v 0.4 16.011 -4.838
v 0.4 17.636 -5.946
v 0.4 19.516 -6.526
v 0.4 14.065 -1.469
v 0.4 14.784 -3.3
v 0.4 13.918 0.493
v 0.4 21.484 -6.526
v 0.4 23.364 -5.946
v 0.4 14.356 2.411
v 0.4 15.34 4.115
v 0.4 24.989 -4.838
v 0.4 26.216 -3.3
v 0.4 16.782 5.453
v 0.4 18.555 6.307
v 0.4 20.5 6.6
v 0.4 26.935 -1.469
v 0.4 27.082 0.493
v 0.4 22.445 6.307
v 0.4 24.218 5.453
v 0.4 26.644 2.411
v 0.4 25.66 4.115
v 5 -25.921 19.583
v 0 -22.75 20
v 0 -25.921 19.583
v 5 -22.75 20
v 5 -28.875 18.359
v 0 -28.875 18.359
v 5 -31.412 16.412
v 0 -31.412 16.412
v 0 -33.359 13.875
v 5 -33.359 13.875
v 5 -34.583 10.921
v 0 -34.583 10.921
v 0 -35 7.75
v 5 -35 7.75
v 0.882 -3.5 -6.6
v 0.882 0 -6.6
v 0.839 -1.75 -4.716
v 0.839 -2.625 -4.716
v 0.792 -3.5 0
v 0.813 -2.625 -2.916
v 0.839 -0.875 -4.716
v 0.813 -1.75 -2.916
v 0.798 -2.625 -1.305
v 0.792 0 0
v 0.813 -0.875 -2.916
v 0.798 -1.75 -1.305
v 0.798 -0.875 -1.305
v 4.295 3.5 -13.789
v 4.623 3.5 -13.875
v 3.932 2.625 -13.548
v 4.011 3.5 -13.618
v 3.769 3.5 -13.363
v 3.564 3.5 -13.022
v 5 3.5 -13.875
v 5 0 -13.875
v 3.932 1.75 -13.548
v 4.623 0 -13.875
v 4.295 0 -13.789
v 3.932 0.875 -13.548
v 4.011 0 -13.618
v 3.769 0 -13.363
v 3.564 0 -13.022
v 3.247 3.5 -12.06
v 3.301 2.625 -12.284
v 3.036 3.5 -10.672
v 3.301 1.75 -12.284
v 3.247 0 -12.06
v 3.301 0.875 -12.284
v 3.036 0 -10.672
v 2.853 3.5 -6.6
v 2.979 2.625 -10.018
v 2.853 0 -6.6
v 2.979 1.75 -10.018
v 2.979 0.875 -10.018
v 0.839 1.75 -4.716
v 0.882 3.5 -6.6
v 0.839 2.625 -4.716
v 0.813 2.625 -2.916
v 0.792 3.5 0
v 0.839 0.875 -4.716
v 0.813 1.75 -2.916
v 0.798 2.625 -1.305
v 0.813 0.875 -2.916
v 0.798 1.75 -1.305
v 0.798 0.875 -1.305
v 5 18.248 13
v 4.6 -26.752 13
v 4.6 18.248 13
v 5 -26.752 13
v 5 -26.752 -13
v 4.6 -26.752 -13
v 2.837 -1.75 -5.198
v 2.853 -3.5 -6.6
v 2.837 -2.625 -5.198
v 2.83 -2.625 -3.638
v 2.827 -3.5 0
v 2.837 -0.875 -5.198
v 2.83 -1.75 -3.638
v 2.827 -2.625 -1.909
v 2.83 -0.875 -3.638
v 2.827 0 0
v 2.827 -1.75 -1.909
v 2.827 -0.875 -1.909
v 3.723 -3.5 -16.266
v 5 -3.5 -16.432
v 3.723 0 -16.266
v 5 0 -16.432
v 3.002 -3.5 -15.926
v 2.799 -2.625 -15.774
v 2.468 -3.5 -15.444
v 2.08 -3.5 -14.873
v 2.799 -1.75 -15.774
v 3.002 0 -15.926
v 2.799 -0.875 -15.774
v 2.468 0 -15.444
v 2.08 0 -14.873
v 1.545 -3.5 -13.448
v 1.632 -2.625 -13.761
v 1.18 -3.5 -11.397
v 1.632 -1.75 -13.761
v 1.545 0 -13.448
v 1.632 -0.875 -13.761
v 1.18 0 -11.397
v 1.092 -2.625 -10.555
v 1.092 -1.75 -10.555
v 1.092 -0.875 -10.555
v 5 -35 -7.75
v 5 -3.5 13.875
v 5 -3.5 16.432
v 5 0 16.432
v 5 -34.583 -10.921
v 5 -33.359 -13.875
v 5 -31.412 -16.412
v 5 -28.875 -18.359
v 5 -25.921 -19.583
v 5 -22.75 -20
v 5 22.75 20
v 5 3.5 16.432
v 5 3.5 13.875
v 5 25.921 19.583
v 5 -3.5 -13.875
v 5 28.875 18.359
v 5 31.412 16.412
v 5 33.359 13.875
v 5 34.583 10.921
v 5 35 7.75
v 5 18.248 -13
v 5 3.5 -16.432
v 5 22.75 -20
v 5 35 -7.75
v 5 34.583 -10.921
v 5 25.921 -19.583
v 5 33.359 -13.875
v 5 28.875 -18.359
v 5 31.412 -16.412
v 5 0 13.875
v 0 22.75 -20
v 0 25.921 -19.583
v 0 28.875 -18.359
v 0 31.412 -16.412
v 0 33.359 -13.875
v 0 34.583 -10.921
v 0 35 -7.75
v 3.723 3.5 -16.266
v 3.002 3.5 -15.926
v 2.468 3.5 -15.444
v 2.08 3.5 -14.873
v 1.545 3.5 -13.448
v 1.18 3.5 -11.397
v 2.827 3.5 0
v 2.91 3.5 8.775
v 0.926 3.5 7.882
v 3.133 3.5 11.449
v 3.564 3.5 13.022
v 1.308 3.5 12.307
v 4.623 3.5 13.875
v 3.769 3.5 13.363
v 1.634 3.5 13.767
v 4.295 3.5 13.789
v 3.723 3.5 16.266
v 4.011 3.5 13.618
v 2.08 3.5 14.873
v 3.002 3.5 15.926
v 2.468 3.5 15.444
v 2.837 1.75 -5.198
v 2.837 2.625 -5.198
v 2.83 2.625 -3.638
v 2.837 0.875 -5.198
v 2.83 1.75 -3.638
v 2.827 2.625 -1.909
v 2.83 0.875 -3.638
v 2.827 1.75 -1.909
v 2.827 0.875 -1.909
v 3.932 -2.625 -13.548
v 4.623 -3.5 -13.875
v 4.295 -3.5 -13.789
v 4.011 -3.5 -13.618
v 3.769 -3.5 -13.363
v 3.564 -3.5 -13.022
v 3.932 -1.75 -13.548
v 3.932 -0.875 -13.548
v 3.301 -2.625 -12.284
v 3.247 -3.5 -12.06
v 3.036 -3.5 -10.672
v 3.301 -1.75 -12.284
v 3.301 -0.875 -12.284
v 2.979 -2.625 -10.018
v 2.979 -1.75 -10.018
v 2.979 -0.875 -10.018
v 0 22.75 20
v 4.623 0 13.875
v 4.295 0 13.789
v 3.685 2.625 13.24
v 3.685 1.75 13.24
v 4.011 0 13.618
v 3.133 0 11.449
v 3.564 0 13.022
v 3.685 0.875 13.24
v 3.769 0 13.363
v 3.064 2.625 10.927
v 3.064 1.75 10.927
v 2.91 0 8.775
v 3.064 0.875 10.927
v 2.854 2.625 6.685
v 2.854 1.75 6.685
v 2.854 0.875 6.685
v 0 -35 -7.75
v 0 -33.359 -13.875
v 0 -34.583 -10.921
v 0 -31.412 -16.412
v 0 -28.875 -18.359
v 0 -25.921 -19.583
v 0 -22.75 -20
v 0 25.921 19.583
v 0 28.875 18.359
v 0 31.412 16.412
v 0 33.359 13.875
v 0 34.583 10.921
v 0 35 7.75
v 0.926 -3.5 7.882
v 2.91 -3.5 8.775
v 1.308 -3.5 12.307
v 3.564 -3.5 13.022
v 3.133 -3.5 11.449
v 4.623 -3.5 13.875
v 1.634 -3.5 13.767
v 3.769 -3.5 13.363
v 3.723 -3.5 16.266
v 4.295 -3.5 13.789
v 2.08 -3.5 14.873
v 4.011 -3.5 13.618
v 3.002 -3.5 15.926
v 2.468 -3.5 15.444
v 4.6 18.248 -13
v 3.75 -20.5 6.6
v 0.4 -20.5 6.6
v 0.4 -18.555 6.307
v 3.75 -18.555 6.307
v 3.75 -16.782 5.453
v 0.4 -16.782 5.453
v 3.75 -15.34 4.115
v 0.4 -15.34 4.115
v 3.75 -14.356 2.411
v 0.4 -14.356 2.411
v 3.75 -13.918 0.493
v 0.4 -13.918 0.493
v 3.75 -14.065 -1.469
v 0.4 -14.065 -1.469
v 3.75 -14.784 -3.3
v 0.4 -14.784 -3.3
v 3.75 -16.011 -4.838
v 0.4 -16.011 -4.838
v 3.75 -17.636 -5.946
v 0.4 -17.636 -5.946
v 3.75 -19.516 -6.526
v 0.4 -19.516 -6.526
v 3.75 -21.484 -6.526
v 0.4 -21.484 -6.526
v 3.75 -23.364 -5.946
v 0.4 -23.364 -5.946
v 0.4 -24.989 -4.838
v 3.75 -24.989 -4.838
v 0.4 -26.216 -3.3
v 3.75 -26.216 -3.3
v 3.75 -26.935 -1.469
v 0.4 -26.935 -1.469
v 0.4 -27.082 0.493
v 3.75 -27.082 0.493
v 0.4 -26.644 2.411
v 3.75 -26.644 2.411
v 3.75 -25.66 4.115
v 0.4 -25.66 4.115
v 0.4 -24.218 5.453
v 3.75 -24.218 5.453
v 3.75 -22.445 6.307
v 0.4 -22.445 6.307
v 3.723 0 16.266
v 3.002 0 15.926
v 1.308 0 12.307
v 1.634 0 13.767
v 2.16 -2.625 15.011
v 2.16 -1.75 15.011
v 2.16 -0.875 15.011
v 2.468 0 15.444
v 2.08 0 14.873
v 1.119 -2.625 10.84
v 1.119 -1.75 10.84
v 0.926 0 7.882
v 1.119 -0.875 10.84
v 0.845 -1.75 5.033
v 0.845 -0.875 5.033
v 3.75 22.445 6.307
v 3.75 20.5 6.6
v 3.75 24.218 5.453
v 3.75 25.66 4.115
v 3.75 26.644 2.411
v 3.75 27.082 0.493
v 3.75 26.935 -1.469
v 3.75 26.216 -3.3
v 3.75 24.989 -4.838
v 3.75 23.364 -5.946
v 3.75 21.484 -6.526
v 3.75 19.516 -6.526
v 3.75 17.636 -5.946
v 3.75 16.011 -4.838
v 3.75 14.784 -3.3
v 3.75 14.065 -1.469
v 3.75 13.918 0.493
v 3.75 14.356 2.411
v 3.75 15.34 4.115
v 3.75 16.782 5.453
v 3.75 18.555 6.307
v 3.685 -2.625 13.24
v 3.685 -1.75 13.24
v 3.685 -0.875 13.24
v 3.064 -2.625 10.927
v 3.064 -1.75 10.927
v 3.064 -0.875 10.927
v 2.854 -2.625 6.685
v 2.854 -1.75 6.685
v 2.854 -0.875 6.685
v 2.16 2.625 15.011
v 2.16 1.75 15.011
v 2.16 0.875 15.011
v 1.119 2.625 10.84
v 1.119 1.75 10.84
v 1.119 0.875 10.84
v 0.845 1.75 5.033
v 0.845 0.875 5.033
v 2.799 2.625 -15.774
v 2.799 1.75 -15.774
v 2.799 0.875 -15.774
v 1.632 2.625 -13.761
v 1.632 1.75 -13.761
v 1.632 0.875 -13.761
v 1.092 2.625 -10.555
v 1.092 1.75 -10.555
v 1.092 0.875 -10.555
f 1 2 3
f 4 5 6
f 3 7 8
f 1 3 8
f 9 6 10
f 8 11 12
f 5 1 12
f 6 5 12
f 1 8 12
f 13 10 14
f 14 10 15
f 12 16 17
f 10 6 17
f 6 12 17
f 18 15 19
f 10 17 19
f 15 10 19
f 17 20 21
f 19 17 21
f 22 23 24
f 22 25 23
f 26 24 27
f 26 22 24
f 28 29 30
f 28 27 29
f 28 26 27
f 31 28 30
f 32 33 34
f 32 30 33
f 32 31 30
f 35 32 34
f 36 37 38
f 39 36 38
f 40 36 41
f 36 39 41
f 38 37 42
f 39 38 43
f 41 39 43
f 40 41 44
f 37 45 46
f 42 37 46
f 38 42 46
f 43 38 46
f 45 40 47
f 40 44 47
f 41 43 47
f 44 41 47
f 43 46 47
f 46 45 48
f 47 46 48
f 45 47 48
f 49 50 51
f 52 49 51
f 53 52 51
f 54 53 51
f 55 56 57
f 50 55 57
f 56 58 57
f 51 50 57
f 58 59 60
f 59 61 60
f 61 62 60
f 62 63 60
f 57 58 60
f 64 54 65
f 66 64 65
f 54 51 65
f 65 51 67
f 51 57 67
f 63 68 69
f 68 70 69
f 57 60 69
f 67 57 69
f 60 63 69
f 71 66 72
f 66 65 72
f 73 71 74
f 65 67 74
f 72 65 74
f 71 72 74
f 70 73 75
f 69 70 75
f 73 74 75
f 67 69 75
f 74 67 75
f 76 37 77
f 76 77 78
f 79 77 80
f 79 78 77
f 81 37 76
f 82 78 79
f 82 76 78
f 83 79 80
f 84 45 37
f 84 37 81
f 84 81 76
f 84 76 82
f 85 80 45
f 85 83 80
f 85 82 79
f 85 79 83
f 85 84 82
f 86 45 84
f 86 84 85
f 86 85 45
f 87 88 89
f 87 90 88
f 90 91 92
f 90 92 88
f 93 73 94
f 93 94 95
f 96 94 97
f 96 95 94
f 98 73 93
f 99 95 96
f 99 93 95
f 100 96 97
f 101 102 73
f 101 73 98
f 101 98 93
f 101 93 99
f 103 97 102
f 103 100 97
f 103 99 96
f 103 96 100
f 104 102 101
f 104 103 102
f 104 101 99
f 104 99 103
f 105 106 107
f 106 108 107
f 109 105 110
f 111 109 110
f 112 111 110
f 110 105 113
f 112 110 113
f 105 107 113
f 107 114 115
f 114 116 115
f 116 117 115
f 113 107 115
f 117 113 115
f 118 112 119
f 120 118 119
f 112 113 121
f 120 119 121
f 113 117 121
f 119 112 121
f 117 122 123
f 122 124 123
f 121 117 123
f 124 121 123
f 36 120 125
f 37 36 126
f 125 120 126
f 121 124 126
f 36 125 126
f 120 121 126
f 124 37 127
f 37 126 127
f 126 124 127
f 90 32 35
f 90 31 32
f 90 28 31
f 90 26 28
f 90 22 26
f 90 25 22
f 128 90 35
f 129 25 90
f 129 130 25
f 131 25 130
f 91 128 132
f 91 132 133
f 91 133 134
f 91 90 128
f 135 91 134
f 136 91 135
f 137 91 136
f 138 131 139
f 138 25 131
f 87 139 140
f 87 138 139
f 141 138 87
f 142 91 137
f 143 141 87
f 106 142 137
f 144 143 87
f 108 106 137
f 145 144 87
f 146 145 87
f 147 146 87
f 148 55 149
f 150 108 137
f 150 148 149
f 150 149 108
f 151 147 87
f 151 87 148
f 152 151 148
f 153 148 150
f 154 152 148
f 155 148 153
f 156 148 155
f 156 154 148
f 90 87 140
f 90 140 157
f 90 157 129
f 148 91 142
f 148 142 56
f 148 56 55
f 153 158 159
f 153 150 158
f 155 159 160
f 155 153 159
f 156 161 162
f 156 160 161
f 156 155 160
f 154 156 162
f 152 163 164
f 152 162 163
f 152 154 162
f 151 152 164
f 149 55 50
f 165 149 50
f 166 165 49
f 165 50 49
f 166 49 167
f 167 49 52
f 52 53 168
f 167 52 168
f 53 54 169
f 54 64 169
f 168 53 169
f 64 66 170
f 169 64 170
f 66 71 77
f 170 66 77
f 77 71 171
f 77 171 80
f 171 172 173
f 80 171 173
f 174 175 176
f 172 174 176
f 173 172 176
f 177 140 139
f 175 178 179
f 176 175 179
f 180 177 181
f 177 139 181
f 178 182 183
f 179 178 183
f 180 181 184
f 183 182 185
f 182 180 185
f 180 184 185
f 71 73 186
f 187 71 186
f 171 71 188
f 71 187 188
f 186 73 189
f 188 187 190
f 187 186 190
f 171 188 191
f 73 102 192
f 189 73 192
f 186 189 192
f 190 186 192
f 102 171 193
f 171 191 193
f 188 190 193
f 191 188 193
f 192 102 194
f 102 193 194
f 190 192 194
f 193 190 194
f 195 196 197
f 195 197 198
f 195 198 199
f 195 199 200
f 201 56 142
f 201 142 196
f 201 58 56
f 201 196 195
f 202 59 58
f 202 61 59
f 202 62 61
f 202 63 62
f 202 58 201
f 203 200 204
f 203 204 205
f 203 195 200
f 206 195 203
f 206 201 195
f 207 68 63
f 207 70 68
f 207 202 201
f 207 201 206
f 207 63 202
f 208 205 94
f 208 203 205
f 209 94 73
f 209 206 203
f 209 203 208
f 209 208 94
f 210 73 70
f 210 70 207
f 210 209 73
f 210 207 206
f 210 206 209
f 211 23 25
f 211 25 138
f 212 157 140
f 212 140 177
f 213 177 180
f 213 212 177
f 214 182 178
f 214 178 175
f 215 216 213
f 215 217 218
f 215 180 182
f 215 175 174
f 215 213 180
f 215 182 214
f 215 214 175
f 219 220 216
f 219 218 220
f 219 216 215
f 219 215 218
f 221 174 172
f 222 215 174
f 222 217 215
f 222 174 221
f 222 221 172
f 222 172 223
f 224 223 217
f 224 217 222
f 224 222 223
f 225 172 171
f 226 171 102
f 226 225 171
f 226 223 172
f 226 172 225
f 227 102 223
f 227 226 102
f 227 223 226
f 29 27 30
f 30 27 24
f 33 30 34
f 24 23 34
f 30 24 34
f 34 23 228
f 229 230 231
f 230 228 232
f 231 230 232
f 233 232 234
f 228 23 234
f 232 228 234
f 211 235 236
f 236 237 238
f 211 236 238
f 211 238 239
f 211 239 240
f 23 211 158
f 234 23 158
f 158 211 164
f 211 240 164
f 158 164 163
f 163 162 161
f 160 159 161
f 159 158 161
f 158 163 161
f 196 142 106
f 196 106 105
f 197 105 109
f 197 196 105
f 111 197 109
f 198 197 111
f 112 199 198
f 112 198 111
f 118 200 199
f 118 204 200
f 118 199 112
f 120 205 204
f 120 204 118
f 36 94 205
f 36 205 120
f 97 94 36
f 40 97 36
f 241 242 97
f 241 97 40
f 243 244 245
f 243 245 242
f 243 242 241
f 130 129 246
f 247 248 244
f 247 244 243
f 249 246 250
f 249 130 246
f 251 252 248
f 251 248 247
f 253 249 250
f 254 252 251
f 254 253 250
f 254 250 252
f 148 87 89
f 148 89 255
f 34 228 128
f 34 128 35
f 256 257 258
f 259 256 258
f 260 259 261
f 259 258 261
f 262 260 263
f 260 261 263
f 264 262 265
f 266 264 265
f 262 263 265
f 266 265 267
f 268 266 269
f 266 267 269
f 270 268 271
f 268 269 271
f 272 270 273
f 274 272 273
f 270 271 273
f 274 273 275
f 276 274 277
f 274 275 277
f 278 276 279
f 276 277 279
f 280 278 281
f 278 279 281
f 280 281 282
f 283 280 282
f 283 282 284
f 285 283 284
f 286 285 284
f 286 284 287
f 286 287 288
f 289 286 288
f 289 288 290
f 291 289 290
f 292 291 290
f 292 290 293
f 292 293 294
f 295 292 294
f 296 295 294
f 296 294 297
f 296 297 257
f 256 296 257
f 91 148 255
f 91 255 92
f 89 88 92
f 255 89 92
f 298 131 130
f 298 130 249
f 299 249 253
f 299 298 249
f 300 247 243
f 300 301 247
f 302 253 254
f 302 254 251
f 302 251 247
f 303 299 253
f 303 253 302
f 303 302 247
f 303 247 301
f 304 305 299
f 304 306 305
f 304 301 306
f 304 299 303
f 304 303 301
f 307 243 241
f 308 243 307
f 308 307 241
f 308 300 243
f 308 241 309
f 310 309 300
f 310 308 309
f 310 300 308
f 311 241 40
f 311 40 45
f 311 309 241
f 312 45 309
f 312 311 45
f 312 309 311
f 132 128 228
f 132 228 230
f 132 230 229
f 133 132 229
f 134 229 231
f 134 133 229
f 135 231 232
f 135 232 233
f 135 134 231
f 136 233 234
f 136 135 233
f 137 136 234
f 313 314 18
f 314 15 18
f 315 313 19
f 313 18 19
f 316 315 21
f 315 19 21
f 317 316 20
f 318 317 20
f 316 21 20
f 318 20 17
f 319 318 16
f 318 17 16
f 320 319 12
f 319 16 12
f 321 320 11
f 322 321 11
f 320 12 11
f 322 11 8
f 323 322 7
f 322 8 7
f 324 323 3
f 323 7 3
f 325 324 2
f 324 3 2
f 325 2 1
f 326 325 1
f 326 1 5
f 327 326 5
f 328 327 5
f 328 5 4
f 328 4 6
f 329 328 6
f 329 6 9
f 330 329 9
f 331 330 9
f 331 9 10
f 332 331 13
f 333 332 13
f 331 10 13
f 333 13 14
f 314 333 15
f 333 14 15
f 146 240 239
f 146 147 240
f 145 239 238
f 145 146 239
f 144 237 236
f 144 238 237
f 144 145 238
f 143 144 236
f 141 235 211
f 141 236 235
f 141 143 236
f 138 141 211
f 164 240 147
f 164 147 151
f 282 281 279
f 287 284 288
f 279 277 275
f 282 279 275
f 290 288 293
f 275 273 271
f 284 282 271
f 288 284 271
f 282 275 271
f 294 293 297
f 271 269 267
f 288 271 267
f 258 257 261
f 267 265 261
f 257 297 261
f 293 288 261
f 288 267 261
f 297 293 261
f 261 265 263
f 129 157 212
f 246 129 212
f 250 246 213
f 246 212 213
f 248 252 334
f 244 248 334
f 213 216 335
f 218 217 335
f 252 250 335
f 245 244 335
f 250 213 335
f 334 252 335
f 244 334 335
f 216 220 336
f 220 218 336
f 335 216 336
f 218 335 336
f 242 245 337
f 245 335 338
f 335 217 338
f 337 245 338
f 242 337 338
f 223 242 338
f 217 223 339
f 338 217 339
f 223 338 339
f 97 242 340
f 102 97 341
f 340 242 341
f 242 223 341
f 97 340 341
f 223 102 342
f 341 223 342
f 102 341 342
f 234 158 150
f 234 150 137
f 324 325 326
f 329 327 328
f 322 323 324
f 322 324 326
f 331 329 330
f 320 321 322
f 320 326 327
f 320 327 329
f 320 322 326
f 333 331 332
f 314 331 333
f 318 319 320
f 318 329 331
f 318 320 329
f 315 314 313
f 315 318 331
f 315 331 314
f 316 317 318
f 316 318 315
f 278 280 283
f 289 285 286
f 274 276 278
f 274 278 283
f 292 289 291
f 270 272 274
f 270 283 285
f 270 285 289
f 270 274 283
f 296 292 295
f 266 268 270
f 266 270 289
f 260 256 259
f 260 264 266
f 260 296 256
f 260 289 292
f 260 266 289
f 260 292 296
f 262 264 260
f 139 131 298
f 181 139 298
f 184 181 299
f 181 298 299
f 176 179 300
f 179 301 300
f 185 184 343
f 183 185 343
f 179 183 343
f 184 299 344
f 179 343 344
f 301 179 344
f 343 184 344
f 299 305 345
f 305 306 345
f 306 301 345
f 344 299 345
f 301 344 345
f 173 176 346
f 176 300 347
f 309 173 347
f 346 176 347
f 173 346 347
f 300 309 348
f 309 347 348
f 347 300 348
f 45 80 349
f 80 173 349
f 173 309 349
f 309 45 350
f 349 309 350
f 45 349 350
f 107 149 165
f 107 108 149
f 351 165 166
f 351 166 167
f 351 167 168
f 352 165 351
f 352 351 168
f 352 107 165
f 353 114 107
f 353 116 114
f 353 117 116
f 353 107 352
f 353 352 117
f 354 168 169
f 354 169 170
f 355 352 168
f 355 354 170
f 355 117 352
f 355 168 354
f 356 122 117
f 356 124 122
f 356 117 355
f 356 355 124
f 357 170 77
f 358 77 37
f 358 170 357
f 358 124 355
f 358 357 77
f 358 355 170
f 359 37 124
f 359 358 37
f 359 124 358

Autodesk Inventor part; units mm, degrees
ref_plane "YZ Plane" through (0, 0, 0) normal (1, 0, 0) x (0, 1, 0)
ref_plane "XZ Plane" through (0, 0, 0) normal (0, 1, 0) x (-1, 0, 0)
ref_plane "XY Plane" through (0, 0, 0) normal (0, 0, 1) x (1, 0, 0)
ref_plane "Work Plane2" through (0, 0, 0) normal (1, 0, 0) x (0, 0, -1)
sketch "Sketch1" plane through (0, 0, 0) normal (1, 0, 0) x (0, 0, -1)
  line L0 (20, -35) -> (-20, -35)
  line L1 (-20, -35) -> (-20, 35)
  line L2 (-20, 35) -> (20, 35)
  line L3 (20, 35) -> (20, -35)
  line L4 (20, -35) -> (-20, 35) construction
  line L5 (-20, -35) -> (20, 35) construction
  point P0 (0, 0)
  dimension "d0" = 40
  dimension "d1" = 70
extrude "Extrusion1" add sketch "Sketch1" along normal blind 5
fillet "Fillet1" radius 12.25 4 edges at (2.5, -35, 20) (2.5, -35, -20) (2.5, 35, -20) (2.5, 35, 20)
sketch "Sketch2" plane through (0, 0, 0) normal (-1, 0, 0) x (0, 0, 1)
  circle A0 centre (0, -20.5) radius 6.6
  line L0 (30.2912, 0) -> (32.4021, 0)
  circle A1 centre (0, 20.5) radius 6.6
  point P0 (0, 0)
  dimension "d5" = 13.2
  dimension "d17" = 41
extrude "Extrusion2" cut sketch "Sketch2" against normal blind 3.75
sketch "Sketch3" plane through (0, 0, 0) normal (-1, 0, 0) x (0, 0, 1)
  circle A0 centre (0, 20.5) radius 6.6 projected
  circle A1 centre (0, -20.5) radius 6.6 projected
  point P0 (0, 0)
extrude "Extrusion3" add sketch "Sketch3" against normal blind 0.4
sketch "Sketch4" plane through (5, 0, 0) normal (1, 0, 0) x (0, 0, -1)
  line L0 (13, -26.7517) -> (-13, -26.7517)
  line L1 (-13, -26.7517) -> (-13, 18.2483)
  line L2 (-13, 18.2483) -> (13, 18.2483)
  line L3 (13, 18.2483) -> (13, -26.7517)
  line L4 (13, -26.7517) -> (-13, 18.2483) construction
  line L5 (-13, -26.7517) -> (13, 18.2483) construction
  point P0 (0, -4.2517)
  point P1 (0, 0)
  dimension "d10" = 26
  dimension "d11" = 45
  dimension "d12" = 0
extrude "Extrusion4" cut sketch "Sketch4" against normal blind 0.4
sketch "Sketch6" plane through (0, 0, 0) normal (0, 1, 0) x (-1, 0, 0)
  line L0 (5.3087, 0) -> (6.8591, 0)
  line L1 (-5, -20) -> (-5, -7.75) projected
  line L2 (-5, -13.875) -> (-3.2306, -14.0634) construction
  line L3 (-3.2306, -14.0634) -> (-2.8267, -12.0185) construction
  line L4 (-2.8267, -12.0185) -> (-2.8267, -8.1465) construction
  line L5 (-2.8267, -8.1465) -> (-2.8267, 0) construction
  spline S0 degree 4 poles (-5, -13.875) (-3.2306, -14.0634) (-2.8267, -12.0185) (-2.8267, -8.1465) (-2.8267, 0) knots 1 1 1 1 1 2 2 2 2 2
  line L6 (-5, -16.4324) -> (-0.7919, -16.4324) construction
  line L7 (-0.7919, -16.4324) -> (-0.9641, -12.8693) construction
  line L8 (-0.9641, -12.8693) -> (-0.7919, -3.5174) construction
  line L9 (-0.7919, -3.5174) -> (-0.7919, 0) construction
  line L10 (-0.4, -6.6) -> (-3.75, -6.6) projected
  spline S1 degree 4 poles (-5, -16.4324) (-0.7919, -16.4324) (-0.9641, -12.8693) (-0.7919, -3.5174) (-0.7919, 0) knots 1 1 1 1 1 2 2 2 2 2
  line L11 (-5, -16.4324) -> (-5, -13.875)
  line L12 (-2.8267, 0) -> (-0.7919, 0)
  line L13 (-5, 13.875) -> (-3.2306, 14.0634) construction
  line L14 (-3.2306, 14.0634) -> (-2.8267, 12.0185) construction
  line L15 (-2.8267, 12.0185) -> (-2.8267, 8.1465) construction
  line L16 (-2.8267, 8.1465) -> (-2.8267, 0) construction
  spline S2 degree 4 poles (-5, 13.875) (-3.2306, 14.0634) (-2.8267, 12.0185) (-2.8267, 8.1465) (-2.8267, 0) knots 1 1 1 1 1 2 2 2 2 2
  line L17 (-5, 16.4324) -> (-0.7919, 16.4324) construction
  line L18 (-0.7919, 16.4324) -> (-0.9641, 12.8693) construction
  line L19 (-0.9641, 12.8693) -> (-0.7919, 3.5174) construction
  line L20 (-0.7919, 3.5174) -> (-0.7919, 0) construction
  spline S3 degree 4 poles (-5, 16.4324) (-0.7919, 16.4324) (-0.9641, 12.8693) (-0.7919, 3.5174) (-0.7919, 0) knots 1 1 1 1 1 2 2 2 2 2
  line L21 (-5, -13.875) -> (-5, -16.4324)
  line L22 (-5, 13.875) -> (-5, 16.4324)
  point P0 (0, 0)
extrude "Extrusion5" cut sketch "Sketch6" along normal mid plane 7
properties part number "Sentroller_Mount"
